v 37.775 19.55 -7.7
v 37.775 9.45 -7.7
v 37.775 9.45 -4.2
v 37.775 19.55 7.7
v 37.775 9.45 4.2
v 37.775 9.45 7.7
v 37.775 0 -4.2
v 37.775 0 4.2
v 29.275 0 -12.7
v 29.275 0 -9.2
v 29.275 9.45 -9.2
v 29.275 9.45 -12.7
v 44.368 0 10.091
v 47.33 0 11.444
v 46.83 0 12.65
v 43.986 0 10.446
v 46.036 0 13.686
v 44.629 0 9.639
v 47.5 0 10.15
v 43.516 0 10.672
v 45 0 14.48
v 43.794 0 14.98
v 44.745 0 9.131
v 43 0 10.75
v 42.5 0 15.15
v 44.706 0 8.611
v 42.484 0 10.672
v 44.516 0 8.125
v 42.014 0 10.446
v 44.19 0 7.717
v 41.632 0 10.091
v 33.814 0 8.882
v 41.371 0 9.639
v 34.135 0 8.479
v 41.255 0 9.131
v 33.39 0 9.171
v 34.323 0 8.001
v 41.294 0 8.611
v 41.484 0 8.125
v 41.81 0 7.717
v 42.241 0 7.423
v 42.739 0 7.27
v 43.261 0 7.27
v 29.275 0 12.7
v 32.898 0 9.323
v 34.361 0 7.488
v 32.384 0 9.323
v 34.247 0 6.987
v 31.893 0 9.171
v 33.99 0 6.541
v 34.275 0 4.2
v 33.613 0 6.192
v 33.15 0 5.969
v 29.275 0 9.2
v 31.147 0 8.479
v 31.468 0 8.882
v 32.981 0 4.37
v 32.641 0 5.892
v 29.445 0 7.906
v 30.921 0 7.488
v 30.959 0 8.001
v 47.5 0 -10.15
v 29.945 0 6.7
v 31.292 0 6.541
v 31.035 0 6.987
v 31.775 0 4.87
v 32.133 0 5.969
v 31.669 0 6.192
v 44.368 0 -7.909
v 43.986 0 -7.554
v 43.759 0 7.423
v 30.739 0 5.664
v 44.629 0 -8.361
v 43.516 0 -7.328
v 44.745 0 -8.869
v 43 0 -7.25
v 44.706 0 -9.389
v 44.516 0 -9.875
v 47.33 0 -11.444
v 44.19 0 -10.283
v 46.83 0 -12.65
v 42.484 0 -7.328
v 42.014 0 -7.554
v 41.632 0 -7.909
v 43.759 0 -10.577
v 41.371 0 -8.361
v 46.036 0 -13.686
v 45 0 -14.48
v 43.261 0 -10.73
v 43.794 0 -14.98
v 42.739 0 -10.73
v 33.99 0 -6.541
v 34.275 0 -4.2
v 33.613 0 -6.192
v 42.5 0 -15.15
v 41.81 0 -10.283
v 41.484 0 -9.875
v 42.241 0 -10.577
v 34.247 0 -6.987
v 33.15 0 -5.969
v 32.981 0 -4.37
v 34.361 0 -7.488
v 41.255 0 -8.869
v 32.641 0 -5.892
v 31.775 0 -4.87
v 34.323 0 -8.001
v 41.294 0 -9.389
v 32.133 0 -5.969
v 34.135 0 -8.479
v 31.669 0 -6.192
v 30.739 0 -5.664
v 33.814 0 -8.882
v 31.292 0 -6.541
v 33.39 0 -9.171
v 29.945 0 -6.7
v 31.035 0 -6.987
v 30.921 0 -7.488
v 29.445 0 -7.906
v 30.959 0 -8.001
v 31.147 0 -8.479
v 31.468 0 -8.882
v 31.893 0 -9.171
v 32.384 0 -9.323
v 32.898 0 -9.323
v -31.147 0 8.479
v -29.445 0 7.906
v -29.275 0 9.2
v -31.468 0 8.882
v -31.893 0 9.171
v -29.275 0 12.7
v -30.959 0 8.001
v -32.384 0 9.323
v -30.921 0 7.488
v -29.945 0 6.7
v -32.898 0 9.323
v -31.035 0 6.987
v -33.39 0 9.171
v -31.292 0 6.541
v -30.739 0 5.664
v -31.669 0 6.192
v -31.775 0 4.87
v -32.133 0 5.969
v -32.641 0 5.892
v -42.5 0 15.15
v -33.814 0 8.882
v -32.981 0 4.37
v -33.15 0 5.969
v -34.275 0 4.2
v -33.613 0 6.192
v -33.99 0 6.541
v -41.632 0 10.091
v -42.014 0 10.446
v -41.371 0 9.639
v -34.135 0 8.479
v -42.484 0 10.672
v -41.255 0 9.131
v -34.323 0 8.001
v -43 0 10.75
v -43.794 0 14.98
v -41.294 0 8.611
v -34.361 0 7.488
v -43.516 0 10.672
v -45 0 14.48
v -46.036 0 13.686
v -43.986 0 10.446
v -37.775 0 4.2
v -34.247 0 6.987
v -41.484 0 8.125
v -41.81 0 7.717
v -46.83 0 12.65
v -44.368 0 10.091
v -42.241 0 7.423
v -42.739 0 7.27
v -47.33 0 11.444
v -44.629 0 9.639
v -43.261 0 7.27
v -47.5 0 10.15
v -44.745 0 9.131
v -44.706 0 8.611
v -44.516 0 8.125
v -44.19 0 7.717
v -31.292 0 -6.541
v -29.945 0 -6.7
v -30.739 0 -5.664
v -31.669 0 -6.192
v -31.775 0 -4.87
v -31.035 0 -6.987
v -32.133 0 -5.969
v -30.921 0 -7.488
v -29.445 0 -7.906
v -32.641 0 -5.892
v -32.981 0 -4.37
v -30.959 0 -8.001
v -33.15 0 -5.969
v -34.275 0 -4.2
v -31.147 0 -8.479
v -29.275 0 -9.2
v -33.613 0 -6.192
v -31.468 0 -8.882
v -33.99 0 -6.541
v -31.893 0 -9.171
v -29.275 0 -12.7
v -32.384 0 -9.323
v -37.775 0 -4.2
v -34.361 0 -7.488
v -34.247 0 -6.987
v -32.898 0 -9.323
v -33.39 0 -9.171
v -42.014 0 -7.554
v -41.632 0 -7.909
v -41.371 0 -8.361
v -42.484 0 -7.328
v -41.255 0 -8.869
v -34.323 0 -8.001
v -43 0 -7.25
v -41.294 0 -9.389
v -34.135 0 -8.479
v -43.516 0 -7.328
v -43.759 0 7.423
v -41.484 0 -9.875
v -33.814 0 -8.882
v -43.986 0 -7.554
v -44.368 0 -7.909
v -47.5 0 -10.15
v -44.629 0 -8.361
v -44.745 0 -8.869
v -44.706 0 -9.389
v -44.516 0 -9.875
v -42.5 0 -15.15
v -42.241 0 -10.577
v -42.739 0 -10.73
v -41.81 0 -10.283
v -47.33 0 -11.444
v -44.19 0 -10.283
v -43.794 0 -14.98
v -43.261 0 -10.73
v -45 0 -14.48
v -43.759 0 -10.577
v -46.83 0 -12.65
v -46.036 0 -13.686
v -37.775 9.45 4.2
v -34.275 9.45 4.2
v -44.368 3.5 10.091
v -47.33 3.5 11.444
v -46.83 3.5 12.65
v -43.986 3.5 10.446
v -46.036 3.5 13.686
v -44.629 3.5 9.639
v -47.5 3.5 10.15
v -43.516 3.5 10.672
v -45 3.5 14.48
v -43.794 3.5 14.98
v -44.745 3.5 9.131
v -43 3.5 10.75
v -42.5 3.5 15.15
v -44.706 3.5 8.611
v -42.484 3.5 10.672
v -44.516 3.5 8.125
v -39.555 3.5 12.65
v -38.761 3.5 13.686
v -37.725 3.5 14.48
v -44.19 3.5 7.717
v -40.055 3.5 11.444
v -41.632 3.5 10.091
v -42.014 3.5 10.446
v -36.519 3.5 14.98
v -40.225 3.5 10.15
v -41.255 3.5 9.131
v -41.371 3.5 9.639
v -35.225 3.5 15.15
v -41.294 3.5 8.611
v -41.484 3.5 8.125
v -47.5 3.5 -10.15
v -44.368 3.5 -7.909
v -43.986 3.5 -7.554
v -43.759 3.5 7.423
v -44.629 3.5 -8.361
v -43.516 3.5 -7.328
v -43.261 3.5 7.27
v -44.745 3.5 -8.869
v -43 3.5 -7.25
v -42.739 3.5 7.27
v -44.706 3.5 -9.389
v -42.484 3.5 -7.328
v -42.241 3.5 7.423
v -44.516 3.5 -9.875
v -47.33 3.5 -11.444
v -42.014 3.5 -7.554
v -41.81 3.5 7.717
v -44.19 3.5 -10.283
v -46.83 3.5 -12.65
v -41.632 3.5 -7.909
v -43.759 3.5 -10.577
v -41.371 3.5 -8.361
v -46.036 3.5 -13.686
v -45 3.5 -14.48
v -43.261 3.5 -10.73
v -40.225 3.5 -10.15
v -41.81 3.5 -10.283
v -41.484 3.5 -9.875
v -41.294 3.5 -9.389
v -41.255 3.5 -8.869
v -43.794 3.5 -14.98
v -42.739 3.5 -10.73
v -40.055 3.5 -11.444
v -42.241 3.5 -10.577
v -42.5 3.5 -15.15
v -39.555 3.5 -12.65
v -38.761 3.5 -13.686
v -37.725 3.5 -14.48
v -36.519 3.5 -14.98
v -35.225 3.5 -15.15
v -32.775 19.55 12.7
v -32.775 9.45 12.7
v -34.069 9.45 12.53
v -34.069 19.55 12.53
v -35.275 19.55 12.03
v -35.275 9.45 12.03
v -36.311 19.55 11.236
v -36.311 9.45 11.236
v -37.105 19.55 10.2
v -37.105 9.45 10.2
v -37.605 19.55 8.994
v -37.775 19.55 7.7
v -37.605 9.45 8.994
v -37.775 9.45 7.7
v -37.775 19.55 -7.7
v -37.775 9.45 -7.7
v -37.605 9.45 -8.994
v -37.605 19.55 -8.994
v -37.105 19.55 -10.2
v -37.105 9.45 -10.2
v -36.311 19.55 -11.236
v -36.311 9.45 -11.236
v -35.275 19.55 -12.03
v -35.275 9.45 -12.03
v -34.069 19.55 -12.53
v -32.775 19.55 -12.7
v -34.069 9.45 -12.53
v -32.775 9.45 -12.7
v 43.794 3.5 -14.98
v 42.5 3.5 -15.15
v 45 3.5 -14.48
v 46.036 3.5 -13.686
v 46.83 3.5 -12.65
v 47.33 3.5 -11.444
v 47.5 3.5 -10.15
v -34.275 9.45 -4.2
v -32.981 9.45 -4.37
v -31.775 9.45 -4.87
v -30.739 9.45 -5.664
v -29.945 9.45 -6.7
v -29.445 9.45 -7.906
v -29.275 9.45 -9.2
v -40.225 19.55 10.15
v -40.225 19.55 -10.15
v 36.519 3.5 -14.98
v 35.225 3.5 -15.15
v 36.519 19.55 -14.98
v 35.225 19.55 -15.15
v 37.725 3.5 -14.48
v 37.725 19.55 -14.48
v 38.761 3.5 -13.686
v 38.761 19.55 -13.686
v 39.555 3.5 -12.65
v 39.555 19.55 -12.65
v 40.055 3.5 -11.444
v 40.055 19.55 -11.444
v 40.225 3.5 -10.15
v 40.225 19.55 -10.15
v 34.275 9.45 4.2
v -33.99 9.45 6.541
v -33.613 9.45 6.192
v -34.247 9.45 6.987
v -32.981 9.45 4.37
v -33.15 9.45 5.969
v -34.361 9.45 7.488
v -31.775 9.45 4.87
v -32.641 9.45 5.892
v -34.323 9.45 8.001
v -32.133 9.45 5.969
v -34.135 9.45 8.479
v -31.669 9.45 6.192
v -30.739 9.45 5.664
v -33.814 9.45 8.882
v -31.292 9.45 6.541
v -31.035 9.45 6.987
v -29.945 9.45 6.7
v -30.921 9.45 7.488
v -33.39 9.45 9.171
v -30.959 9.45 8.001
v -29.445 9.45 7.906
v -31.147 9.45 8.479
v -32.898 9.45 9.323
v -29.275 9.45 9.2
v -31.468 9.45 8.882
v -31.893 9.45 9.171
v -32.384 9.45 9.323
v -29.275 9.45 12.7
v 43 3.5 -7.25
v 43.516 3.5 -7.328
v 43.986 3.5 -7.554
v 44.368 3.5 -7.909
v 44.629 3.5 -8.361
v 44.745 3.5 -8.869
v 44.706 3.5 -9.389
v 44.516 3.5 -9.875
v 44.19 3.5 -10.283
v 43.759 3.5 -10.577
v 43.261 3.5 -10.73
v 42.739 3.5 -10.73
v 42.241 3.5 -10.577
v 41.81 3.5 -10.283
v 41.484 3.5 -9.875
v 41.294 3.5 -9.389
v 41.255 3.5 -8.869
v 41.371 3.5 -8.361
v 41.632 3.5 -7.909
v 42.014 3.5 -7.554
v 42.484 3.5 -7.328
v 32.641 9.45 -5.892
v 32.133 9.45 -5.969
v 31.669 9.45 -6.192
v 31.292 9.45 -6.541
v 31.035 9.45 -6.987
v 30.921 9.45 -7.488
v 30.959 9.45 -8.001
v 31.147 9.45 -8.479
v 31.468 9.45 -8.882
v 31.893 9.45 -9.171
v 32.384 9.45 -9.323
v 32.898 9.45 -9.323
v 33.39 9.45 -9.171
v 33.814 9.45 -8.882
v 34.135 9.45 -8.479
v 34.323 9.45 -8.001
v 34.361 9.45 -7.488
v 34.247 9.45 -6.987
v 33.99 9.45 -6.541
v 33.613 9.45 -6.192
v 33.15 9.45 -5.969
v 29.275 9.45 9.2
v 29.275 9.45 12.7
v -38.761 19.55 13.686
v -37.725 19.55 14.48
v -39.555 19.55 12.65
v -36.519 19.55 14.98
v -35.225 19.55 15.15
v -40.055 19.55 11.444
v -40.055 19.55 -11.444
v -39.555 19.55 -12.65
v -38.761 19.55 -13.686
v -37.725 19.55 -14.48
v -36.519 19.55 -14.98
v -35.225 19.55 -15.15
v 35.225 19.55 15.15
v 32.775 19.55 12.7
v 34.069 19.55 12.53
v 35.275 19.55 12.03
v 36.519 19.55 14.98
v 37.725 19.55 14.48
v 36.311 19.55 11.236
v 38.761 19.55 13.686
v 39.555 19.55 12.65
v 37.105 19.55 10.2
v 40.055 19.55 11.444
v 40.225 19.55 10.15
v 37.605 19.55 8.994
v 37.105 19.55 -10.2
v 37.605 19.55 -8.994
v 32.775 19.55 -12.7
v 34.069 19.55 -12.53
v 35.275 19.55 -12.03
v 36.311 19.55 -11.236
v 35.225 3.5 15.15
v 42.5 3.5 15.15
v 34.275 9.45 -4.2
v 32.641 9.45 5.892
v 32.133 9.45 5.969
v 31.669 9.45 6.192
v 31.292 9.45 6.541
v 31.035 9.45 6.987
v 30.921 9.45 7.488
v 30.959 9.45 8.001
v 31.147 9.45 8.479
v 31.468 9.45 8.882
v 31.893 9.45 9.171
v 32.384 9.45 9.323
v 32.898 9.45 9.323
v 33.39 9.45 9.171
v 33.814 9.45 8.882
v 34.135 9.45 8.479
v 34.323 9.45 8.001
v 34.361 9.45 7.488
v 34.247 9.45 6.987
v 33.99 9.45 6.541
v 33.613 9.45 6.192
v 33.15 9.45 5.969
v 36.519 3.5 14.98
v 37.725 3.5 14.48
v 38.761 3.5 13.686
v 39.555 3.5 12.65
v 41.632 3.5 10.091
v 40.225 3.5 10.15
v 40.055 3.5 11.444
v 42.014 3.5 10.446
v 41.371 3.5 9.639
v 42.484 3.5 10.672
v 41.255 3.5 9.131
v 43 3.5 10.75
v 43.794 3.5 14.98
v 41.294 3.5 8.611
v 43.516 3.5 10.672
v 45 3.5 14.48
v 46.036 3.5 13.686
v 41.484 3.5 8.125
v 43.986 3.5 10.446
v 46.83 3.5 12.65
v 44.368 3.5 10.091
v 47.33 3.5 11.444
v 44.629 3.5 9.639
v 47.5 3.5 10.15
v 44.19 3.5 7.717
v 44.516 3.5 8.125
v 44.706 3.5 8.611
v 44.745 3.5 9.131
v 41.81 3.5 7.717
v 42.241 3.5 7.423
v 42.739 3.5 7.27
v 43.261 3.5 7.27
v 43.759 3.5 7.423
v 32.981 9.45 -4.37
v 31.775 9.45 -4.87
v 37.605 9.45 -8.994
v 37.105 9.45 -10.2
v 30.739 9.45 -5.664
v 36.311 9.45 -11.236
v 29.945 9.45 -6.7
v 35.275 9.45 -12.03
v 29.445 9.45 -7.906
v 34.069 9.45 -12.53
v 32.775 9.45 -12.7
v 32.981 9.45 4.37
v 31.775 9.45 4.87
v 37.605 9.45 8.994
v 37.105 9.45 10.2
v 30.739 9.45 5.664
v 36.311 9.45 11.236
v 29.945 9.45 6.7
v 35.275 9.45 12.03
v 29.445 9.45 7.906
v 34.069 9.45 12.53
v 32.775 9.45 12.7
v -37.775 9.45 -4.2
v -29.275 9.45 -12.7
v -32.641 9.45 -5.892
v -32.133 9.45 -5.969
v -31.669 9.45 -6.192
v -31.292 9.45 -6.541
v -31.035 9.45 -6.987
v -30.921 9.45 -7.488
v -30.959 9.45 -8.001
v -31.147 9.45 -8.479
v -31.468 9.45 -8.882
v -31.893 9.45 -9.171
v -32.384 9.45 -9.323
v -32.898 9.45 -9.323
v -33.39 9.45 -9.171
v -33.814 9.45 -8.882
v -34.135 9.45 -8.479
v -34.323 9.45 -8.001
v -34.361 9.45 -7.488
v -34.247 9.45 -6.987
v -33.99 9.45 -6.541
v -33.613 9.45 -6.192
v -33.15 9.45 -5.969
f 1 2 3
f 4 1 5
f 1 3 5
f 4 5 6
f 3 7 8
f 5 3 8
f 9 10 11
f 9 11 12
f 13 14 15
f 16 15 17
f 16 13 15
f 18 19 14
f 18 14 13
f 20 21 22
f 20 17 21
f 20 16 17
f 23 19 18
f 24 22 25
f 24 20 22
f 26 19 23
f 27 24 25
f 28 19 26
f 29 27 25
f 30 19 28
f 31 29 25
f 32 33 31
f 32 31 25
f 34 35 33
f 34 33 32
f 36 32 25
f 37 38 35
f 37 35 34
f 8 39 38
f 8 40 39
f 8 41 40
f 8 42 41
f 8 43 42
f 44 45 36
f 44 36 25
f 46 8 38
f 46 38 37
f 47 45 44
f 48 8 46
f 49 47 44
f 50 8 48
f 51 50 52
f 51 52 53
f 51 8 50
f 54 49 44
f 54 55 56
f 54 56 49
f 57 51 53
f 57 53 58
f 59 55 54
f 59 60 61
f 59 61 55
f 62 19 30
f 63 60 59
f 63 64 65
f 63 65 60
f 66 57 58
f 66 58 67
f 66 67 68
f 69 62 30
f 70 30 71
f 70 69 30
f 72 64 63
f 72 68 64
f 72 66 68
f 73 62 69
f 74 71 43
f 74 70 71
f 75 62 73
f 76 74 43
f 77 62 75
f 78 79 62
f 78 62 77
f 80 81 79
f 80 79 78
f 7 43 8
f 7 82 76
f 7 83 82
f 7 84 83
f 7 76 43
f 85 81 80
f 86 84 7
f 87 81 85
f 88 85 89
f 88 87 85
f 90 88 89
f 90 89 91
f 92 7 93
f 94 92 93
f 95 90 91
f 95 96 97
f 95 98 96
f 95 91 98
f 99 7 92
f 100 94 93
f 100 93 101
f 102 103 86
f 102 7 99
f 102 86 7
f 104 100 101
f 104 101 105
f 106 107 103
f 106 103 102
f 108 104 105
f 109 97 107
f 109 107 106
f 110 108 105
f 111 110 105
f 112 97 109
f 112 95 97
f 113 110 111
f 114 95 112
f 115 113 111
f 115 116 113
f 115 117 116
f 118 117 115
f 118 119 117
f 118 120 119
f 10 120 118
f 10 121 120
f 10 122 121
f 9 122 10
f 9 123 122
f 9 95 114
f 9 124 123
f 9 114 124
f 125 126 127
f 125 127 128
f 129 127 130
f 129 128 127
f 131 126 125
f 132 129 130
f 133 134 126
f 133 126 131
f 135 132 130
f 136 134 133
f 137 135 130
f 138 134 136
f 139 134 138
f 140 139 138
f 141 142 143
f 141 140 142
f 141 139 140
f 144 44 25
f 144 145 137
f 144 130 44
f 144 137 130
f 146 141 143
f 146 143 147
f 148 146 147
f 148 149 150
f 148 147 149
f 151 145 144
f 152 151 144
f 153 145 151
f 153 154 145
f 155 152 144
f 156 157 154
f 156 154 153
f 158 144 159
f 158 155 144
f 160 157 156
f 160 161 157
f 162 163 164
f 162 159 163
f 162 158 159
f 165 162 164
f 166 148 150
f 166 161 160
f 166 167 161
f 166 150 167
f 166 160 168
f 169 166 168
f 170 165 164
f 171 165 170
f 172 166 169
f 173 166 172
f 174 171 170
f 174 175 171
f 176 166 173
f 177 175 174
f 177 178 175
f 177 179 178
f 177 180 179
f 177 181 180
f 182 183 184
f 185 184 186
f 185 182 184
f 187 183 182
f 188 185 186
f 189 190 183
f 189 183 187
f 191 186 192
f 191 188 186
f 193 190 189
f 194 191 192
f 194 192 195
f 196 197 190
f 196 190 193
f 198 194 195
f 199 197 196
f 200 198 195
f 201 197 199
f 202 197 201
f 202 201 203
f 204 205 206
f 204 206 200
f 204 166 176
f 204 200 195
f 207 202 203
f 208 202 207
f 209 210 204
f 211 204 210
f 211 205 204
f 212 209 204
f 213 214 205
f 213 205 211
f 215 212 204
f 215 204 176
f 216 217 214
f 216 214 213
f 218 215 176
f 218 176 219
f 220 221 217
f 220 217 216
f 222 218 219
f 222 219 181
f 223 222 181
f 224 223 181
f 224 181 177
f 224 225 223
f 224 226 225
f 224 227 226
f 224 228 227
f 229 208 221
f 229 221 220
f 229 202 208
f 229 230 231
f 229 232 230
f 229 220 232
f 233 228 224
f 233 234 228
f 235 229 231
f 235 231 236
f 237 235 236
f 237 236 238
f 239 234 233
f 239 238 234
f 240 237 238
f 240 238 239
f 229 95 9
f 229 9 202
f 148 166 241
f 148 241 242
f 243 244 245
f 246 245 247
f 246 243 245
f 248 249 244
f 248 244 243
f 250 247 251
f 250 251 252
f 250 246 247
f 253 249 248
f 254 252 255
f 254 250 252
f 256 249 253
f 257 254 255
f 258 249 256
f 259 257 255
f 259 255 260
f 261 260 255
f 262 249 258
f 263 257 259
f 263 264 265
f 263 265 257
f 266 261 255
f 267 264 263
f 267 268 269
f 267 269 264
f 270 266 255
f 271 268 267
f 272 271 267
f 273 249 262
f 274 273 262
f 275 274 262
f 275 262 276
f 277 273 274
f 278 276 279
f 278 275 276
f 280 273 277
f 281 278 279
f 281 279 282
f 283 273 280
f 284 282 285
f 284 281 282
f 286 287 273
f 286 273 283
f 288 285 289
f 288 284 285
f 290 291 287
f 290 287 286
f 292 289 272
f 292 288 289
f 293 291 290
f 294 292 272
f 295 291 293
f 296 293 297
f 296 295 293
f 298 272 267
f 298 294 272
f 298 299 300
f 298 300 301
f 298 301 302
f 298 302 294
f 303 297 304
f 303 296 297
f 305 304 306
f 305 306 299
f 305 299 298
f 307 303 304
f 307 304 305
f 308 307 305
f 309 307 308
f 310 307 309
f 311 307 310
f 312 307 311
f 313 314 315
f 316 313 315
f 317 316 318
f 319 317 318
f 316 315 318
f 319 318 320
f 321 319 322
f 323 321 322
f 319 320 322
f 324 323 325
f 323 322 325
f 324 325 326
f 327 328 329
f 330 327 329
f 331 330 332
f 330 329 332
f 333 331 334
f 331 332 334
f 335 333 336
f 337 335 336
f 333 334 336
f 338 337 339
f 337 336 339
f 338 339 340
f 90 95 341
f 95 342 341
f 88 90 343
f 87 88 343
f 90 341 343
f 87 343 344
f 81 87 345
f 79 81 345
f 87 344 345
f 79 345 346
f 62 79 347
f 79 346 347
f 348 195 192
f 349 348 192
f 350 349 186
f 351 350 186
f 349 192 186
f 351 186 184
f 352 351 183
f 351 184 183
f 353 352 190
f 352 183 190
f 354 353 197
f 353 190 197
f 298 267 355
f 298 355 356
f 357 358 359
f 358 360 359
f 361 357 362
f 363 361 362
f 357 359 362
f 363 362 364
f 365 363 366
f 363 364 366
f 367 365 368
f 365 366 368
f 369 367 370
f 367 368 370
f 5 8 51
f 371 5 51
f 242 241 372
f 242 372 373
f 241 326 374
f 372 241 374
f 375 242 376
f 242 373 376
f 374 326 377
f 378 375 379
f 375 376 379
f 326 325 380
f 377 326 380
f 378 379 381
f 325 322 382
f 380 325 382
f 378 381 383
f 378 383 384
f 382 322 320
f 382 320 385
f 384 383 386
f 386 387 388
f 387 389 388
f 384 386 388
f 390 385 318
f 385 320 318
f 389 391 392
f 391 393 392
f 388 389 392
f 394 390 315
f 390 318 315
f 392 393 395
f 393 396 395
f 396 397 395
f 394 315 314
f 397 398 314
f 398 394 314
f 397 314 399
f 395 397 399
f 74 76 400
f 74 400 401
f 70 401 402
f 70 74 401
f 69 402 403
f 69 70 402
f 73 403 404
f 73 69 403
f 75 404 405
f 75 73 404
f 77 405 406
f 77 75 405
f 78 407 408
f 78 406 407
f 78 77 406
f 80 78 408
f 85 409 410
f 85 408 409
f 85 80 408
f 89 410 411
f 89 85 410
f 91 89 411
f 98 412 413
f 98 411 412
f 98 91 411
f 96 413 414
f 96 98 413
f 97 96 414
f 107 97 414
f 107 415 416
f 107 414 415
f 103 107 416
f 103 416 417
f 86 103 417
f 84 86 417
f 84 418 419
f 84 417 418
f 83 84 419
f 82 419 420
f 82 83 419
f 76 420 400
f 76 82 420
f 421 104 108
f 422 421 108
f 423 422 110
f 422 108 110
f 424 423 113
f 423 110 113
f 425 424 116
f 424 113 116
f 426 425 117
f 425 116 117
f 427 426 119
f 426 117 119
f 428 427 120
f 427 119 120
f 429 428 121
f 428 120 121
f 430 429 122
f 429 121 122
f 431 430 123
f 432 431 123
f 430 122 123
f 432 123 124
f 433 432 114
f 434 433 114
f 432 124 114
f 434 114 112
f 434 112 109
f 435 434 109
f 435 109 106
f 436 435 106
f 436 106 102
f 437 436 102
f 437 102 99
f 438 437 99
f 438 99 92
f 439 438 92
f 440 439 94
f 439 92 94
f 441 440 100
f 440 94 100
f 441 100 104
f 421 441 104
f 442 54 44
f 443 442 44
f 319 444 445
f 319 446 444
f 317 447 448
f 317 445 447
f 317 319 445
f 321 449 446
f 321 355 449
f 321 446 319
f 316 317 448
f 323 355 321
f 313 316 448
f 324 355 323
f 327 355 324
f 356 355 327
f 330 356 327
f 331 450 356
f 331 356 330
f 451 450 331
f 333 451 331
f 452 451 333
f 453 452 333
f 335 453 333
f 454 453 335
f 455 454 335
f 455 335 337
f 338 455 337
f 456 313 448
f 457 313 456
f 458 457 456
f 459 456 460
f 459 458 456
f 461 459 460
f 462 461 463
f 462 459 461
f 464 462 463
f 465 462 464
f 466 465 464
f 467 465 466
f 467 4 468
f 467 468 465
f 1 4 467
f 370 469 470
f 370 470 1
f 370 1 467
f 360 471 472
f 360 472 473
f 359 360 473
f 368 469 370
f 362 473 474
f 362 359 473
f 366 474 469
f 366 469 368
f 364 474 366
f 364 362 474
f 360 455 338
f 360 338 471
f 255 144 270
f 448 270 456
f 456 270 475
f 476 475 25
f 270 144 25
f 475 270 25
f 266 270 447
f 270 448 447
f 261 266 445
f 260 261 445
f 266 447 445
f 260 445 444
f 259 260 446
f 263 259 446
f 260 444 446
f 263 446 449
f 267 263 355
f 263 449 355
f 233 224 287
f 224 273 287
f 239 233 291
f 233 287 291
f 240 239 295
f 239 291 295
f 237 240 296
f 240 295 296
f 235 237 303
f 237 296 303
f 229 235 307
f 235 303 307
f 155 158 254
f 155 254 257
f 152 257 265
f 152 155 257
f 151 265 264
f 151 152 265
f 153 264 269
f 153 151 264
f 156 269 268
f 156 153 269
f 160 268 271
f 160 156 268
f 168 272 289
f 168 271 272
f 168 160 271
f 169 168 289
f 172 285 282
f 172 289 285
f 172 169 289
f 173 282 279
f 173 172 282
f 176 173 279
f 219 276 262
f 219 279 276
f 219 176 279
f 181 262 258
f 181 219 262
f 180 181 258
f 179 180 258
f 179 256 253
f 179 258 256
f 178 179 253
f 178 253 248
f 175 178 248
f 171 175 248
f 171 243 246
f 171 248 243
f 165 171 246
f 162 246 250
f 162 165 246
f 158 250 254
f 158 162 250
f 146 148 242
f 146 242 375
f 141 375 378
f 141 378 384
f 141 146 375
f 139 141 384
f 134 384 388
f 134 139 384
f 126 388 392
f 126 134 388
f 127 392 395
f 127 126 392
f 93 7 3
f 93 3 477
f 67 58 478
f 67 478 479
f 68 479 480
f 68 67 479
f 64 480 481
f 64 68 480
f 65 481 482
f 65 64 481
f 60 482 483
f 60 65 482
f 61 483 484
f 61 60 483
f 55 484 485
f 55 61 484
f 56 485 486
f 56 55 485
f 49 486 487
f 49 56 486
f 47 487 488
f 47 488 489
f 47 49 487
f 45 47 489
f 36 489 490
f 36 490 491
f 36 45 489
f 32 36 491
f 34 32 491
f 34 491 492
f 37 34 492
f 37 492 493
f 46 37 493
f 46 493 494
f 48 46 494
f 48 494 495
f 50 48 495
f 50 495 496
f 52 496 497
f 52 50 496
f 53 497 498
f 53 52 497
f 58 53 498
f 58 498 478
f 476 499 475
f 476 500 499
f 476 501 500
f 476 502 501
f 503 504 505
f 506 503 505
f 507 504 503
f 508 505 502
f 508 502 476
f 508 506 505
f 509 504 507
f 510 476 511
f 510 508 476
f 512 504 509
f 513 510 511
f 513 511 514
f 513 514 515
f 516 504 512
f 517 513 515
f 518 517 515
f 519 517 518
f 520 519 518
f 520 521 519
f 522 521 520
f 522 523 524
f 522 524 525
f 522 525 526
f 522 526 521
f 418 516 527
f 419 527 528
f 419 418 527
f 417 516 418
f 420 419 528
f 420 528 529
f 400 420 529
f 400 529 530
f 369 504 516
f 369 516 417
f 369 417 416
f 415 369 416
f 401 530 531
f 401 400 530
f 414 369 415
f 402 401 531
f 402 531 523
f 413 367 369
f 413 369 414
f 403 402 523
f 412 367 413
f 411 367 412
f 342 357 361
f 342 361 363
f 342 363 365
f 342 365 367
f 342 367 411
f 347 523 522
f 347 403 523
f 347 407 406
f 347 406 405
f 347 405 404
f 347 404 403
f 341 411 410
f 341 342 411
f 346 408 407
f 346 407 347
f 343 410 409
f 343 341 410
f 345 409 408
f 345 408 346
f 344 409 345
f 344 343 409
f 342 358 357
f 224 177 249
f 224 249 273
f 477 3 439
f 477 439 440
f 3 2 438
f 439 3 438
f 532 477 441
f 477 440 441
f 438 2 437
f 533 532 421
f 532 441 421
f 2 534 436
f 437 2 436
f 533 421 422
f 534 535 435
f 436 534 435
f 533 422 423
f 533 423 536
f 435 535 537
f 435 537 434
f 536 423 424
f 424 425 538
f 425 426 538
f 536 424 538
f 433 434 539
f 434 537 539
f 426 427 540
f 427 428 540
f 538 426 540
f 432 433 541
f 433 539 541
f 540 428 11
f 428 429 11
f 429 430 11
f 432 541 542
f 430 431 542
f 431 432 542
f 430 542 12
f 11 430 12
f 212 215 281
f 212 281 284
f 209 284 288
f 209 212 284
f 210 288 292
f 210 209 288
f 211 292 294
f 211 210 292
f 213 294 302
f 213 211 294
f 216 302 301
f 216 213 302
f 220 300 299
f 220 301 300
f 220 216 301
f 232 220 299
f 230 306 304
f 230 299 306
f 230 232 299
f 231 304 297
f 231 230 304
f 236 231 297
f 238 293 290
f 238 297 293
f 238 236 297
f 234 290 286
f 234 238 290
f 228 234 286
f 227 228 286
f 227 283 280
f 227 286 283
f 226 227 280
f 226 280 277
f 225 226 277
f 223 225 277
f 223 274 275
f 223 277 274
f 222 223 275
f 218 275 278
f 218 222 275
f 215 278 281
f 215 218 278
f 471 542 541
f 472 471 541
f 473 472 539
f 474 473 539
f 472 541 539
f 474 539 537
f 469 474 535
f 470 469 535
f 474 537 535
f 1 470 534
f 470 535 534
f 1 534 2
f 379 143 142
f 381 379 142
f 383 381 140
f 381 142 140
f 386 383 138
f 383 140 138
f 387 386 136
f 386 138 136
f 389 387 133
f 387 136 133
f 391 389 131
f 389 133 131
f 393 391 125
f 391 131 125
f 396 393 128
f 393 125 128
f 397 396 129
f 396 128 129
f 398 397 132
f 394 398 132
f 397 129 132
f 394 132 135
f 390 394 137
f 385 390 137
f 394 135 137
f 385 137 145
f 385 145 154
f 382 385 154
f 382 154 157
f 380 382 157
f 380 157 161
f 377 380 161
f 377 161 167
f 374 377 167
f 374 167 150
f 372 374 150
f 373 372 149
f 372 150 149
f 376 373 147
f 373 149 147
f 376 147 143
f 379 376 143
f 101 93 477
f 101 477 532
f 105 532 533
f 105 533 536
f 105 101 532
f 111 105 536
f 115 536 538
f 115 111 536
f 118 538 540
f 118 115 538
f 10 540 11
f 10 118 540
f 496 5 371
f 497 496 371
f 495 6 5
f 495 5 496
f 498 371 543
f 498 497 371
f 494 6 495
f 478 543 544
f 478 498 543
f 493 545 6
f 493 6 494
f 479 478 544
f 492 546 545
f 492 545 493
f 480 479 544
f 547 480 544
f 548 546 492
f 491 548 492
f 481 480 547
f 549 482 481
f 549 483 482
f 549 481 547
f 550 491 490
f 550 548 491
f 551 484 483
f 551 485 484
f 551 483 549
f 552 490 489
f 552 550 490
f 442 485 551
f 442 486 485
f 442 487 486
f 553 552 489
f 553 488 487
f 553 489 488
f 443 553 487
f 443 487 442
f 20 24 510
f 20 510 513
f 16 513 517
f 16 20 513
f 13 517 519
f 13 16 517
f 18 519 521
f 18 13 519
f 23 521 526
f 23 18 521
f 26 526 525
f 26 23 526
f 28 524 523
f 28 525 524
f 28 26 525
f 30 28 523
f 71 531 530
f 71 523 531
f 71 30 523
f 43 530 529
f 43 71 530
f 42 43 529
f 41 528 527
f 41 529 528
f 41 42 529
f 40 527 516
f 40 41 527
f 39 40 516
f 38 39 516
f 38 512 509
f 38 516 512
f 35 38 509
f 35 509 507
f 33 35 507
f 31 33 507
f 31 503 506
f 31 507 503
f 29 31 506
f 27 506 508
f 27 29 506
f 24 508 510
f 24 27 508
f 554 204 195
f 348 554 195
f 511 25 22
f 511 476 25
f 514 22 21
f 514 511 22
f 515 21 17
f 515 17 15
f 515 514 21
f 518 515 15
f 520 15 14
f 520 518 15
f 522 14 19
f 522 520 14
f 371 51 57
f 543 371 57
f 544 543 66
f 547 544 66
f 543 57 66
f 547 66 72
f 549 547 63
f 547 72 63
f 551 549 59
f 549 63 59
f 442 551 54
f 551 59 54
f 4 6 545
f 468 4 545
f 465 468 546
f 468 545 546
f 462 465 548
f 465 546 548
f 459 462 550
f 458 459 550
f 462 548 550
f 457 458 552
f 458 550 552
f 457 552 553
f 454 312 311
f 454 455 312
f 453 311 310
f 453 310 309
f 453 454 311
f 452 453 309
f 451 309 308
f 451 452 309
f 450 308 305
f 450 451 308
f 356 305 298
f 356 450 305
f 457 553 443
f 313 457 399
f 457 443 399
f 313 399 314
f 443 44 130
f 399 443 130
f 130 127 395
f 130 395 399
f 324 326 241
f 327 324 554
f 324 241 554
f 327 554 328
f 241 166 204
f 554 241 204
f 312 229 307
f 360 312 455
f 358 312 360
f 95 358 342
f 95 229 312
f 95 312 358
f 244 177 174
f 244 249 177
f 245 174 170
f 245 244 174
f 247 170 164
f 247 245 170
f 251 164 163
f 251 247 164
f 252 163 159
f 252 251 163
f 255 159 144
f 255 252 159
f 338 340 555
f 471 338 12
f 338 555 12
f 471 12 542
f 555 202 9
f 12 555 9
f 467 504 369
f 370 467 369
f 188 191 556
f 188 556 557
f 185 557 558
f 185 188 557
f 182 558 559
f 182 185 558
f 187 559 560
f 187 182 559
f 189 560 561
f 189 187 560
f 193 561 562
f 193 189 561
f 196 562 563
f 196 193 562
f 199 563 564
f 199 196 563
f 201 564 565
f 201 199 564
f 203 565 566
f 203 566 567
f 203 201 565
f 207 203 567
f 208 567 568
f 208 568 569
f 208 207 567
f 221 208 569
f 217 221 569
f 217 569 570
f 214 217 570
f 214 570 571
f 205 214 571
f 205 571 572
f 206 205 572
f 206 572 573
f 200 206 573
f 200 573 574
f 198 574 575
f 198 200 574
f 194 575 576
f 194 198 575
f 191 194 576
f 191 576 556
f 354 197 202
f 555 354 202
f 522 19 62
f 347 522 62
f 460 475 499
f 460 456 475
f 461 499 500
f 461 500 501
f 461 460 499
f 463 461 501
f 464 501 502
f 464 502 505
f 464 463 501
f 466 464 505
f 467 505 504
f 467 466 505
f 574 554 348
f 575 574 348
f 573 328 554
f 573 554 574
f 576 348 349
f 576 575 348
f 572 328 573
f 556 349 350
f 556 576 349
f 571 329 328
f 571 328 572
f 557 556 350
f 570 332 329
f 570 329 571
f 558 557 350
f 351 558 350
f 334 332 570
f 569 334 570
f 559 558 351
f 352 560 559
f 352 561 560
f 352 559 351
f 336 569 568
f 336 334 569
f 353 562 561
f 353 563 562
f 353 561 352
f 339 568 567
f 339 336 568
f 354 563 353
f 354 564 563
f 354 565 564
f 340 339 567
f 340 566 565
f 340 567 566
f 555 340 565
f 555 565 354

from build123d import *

# Parameters (mm, degrees)
SKETCH_1_W               = 95
SKETCH_1_H               = 30.3
EXTRUDE_1_DEPTH          = 3.5
SKETCH_2_W               = 80.45
SKETCH_2_H               = 30.3
EXTRUDE_2_DEPTH          = 16.05
FILLET_1_R               = 5
CUT_EXTRUDE_1_DEPTH      = 54.553477945
CUT_EXTRUDE_1_DEPTH_BACK = 54.553477945
CUT_EXTRUDE_2_DEPTH      = 53.377237422
CUT_EXTRUDE_2_DEPTH_BACK = 53.377237422
SKETCH_4_R               = 1.75
SKETCH_5_R               = 1.725
EXTRUDE_3_DEPTH          = 9.45
MIRROR_2_COPY_1_SKETCH_R = 1.725
MIRROR_2_COPY_1_DEPTH    = 9.45


with BuildPart() as part:
    # Эскиз1 → Бобышка-Вытянуть1 (new body)
    with BuildSketch(Plane(origin=(0, 0, 0), x_dir=(1, 0, 0), z_dir=(0, 1, 0))):
        Rectangle(SKETCH_1_W, SKETCH_1_H)
    extrude(amount=EXTRUDE_1_DEPTH)

    # Эскиз2 → Бобышка-Вытянуть2 (add)
    with BuildSketch(Plane(origin=(0, 3.5, 0), x_dir=(1, 0, 0), z_dir=(0, 1, 0))):
        Rectangle(SKETCH_2_W, SKETCH_2_H)
    extrude(amount=EXTRUDE_2_DEPTH)

    # Скругление1
    fillet_1_edges = [part.edges().sort_by_distance(p)[0] for p in [
        (40.225, 11.525, 15.15),
        (40.225, 11.525, -15.15),
        (-40.225, 11.525, -15.15),
        (-40.225, 11.525, 15.15),
        (47.5, 1.75, 15.15),
        (-47.5, 1.75, 15.15),
        (-47.5, 1.75, -15.15),
        (47.5, 1.75, -15.15),
    ]]
    fillet(fillet_1_edges, radius=FILLET_1_R)

    # Эскиз3 → Вырез-Вытянуть1 (cut, two sides: drawn at the far end of the back side and taken through both)
    with BuildSketch(Plane(origin=(0, 19.55, 0), x_dir=(1, 0, 0), z_dir=(0, 1, 0)).offset(-CUT_EXTRUDE_1_DEPTH_BACK)):
        with BuildLine():
            Line((-32.775, 12.7), (32.775, 12.7))
            ThreePointArc((32.775, 12.7), (36.310533906, 11.235533906), (37.775, 7.7))
            Line((37.775, 7.7), (37.775, -7.7))
            ThreePointArc((37.775, -7.7), (36.310533906, -11.235533906), (32.775, -12.7))
            Line((32.775, -12.7), (-32.775, -12.7))
            ThreePointArc((-32.775, -12.7), (-36.310533906, -11.235533906), (-37.775, -7.7))
            Line((-37.775, -7.7), (-37.775, 7.7))
            ThreePointArc((-37.775, 7.7), (-36.310533906, 11.235533906), (-32.775, 12.7))
        make_face()
    extrude(amount=CUT_EXTRUDE_1_DEPTH + CUT_EXTRUDE_1_DEPTH_BACK, mode=Mode.SUBTRACT)

    # Эскиз4 → Вырез-Вытянуть2 (cut, two sides: drawn at the far end of the back side and taken through both)
    with BuildSketch(Plane(origin=(0, 3.5, 0), x_dir=(1, 0, 0), z_dir=(0, 1, 0)).offset(-CUT_EXTRUDE_2_DEPTH_BACK)):
        with Locations(Location((-43, 9, 0), (0, 0, 270))):
            Circle(SKETCH_4_R)
        with Locations(Location((43, 9, 0), (0, 0, 270))):
            Circle(SKETCH_4_R)
        with Locations(Location((-43, -9, 0), (0, 0, 270))):
            Circle(SKETCH_4_R)
        with Locations(Location((43, -9, 0), (0, 0, 270))):
            Circle(SKETCH_4_R)
    extrude(amount=CUT_EXTRUDE_2_DEPTH + CUT_EXTRUDE_2_DEPTH_BACK, mode=Mode.SUBTRACT)

    # Эскиз5 → Бобышка-Вытянуть3 (add)
    with BuildSketch(Plane.XZ):
        with BuildLine():
            Line((-37.775, 7.7), (-37.775, 4.2))
            Line((-37.775, 4.2), (-34.275, 4.2))
            ThreePointArc((-34.275, 4.2), (-30.739466094, 5.664466094), (-29.275, 9.2))
            Line((-29.275, 9.2), (-29.275, 12.7))
            Line((-29.275, 12.7), (-32.775, 12.7))
            ThreePointArc((-32.775, 12.7), (-36.310533906, 11.235533906), (-37.775, 7.7))
        make_face()
        with Locations(Location((-32.641070297, 7.616996928, 0), (0, 0, 270))):
            Circle(SKETCH_5_R, mode=Mode.SUBTRACT)
    extrude_3 = extrude(amount=-EXTRUDE_3_DEPTH)

    # Зеркальное отражение1: Бобышка-Вытянуть3 across plane
    add(extrude_3.mirror(Plane.XY))

    # Зеркальное отражение2: Бобышка-Вытянуть3 across plane
    add(extrude_3.mirror(Plane(origin=(0, 0, 0), x_dir=(0, 0, 1), z_dir=(1, 0, 0))))

    # Зеркальное отражение2 copy 1 sketch → Зеркальное отражение2 copy 1 (add)
    with BuildSketch(Plane(origin=(0, 0, 0), x_dir=(-1, 0, 0), z_dir=(0, -1, 0))):
        with BuildLine():
            Line((-37.775, 7.7), (-37.775, 4.2))
            Line((-37.775, 4.2), (-34.275, 4.2))
            ThreePointArc((-34.275, 4.2), (-30.739466094, 5.664466094), (-29.275, 9.2))
            Line((-29.275, 9.2), (-29.275, 12.7))
            Line((-29.275, 12.7), (-32.775, 12.7))
            ThreePointArc((-32.775, 12.7), (-36.310533906, 11.235533906), (-37.775, 7.7))
        make_face()
        with Locations(Location((-32.641070297, 7.616996928, 0), (0, 0, 270))):
            Circle(MIRROR_2_COPY_1_SKETCH_R, mode=Mode.SUBTRACT)
    extrude(amount=-MIRROR_2_COPY_1_DEPTH)


solid = part.part
